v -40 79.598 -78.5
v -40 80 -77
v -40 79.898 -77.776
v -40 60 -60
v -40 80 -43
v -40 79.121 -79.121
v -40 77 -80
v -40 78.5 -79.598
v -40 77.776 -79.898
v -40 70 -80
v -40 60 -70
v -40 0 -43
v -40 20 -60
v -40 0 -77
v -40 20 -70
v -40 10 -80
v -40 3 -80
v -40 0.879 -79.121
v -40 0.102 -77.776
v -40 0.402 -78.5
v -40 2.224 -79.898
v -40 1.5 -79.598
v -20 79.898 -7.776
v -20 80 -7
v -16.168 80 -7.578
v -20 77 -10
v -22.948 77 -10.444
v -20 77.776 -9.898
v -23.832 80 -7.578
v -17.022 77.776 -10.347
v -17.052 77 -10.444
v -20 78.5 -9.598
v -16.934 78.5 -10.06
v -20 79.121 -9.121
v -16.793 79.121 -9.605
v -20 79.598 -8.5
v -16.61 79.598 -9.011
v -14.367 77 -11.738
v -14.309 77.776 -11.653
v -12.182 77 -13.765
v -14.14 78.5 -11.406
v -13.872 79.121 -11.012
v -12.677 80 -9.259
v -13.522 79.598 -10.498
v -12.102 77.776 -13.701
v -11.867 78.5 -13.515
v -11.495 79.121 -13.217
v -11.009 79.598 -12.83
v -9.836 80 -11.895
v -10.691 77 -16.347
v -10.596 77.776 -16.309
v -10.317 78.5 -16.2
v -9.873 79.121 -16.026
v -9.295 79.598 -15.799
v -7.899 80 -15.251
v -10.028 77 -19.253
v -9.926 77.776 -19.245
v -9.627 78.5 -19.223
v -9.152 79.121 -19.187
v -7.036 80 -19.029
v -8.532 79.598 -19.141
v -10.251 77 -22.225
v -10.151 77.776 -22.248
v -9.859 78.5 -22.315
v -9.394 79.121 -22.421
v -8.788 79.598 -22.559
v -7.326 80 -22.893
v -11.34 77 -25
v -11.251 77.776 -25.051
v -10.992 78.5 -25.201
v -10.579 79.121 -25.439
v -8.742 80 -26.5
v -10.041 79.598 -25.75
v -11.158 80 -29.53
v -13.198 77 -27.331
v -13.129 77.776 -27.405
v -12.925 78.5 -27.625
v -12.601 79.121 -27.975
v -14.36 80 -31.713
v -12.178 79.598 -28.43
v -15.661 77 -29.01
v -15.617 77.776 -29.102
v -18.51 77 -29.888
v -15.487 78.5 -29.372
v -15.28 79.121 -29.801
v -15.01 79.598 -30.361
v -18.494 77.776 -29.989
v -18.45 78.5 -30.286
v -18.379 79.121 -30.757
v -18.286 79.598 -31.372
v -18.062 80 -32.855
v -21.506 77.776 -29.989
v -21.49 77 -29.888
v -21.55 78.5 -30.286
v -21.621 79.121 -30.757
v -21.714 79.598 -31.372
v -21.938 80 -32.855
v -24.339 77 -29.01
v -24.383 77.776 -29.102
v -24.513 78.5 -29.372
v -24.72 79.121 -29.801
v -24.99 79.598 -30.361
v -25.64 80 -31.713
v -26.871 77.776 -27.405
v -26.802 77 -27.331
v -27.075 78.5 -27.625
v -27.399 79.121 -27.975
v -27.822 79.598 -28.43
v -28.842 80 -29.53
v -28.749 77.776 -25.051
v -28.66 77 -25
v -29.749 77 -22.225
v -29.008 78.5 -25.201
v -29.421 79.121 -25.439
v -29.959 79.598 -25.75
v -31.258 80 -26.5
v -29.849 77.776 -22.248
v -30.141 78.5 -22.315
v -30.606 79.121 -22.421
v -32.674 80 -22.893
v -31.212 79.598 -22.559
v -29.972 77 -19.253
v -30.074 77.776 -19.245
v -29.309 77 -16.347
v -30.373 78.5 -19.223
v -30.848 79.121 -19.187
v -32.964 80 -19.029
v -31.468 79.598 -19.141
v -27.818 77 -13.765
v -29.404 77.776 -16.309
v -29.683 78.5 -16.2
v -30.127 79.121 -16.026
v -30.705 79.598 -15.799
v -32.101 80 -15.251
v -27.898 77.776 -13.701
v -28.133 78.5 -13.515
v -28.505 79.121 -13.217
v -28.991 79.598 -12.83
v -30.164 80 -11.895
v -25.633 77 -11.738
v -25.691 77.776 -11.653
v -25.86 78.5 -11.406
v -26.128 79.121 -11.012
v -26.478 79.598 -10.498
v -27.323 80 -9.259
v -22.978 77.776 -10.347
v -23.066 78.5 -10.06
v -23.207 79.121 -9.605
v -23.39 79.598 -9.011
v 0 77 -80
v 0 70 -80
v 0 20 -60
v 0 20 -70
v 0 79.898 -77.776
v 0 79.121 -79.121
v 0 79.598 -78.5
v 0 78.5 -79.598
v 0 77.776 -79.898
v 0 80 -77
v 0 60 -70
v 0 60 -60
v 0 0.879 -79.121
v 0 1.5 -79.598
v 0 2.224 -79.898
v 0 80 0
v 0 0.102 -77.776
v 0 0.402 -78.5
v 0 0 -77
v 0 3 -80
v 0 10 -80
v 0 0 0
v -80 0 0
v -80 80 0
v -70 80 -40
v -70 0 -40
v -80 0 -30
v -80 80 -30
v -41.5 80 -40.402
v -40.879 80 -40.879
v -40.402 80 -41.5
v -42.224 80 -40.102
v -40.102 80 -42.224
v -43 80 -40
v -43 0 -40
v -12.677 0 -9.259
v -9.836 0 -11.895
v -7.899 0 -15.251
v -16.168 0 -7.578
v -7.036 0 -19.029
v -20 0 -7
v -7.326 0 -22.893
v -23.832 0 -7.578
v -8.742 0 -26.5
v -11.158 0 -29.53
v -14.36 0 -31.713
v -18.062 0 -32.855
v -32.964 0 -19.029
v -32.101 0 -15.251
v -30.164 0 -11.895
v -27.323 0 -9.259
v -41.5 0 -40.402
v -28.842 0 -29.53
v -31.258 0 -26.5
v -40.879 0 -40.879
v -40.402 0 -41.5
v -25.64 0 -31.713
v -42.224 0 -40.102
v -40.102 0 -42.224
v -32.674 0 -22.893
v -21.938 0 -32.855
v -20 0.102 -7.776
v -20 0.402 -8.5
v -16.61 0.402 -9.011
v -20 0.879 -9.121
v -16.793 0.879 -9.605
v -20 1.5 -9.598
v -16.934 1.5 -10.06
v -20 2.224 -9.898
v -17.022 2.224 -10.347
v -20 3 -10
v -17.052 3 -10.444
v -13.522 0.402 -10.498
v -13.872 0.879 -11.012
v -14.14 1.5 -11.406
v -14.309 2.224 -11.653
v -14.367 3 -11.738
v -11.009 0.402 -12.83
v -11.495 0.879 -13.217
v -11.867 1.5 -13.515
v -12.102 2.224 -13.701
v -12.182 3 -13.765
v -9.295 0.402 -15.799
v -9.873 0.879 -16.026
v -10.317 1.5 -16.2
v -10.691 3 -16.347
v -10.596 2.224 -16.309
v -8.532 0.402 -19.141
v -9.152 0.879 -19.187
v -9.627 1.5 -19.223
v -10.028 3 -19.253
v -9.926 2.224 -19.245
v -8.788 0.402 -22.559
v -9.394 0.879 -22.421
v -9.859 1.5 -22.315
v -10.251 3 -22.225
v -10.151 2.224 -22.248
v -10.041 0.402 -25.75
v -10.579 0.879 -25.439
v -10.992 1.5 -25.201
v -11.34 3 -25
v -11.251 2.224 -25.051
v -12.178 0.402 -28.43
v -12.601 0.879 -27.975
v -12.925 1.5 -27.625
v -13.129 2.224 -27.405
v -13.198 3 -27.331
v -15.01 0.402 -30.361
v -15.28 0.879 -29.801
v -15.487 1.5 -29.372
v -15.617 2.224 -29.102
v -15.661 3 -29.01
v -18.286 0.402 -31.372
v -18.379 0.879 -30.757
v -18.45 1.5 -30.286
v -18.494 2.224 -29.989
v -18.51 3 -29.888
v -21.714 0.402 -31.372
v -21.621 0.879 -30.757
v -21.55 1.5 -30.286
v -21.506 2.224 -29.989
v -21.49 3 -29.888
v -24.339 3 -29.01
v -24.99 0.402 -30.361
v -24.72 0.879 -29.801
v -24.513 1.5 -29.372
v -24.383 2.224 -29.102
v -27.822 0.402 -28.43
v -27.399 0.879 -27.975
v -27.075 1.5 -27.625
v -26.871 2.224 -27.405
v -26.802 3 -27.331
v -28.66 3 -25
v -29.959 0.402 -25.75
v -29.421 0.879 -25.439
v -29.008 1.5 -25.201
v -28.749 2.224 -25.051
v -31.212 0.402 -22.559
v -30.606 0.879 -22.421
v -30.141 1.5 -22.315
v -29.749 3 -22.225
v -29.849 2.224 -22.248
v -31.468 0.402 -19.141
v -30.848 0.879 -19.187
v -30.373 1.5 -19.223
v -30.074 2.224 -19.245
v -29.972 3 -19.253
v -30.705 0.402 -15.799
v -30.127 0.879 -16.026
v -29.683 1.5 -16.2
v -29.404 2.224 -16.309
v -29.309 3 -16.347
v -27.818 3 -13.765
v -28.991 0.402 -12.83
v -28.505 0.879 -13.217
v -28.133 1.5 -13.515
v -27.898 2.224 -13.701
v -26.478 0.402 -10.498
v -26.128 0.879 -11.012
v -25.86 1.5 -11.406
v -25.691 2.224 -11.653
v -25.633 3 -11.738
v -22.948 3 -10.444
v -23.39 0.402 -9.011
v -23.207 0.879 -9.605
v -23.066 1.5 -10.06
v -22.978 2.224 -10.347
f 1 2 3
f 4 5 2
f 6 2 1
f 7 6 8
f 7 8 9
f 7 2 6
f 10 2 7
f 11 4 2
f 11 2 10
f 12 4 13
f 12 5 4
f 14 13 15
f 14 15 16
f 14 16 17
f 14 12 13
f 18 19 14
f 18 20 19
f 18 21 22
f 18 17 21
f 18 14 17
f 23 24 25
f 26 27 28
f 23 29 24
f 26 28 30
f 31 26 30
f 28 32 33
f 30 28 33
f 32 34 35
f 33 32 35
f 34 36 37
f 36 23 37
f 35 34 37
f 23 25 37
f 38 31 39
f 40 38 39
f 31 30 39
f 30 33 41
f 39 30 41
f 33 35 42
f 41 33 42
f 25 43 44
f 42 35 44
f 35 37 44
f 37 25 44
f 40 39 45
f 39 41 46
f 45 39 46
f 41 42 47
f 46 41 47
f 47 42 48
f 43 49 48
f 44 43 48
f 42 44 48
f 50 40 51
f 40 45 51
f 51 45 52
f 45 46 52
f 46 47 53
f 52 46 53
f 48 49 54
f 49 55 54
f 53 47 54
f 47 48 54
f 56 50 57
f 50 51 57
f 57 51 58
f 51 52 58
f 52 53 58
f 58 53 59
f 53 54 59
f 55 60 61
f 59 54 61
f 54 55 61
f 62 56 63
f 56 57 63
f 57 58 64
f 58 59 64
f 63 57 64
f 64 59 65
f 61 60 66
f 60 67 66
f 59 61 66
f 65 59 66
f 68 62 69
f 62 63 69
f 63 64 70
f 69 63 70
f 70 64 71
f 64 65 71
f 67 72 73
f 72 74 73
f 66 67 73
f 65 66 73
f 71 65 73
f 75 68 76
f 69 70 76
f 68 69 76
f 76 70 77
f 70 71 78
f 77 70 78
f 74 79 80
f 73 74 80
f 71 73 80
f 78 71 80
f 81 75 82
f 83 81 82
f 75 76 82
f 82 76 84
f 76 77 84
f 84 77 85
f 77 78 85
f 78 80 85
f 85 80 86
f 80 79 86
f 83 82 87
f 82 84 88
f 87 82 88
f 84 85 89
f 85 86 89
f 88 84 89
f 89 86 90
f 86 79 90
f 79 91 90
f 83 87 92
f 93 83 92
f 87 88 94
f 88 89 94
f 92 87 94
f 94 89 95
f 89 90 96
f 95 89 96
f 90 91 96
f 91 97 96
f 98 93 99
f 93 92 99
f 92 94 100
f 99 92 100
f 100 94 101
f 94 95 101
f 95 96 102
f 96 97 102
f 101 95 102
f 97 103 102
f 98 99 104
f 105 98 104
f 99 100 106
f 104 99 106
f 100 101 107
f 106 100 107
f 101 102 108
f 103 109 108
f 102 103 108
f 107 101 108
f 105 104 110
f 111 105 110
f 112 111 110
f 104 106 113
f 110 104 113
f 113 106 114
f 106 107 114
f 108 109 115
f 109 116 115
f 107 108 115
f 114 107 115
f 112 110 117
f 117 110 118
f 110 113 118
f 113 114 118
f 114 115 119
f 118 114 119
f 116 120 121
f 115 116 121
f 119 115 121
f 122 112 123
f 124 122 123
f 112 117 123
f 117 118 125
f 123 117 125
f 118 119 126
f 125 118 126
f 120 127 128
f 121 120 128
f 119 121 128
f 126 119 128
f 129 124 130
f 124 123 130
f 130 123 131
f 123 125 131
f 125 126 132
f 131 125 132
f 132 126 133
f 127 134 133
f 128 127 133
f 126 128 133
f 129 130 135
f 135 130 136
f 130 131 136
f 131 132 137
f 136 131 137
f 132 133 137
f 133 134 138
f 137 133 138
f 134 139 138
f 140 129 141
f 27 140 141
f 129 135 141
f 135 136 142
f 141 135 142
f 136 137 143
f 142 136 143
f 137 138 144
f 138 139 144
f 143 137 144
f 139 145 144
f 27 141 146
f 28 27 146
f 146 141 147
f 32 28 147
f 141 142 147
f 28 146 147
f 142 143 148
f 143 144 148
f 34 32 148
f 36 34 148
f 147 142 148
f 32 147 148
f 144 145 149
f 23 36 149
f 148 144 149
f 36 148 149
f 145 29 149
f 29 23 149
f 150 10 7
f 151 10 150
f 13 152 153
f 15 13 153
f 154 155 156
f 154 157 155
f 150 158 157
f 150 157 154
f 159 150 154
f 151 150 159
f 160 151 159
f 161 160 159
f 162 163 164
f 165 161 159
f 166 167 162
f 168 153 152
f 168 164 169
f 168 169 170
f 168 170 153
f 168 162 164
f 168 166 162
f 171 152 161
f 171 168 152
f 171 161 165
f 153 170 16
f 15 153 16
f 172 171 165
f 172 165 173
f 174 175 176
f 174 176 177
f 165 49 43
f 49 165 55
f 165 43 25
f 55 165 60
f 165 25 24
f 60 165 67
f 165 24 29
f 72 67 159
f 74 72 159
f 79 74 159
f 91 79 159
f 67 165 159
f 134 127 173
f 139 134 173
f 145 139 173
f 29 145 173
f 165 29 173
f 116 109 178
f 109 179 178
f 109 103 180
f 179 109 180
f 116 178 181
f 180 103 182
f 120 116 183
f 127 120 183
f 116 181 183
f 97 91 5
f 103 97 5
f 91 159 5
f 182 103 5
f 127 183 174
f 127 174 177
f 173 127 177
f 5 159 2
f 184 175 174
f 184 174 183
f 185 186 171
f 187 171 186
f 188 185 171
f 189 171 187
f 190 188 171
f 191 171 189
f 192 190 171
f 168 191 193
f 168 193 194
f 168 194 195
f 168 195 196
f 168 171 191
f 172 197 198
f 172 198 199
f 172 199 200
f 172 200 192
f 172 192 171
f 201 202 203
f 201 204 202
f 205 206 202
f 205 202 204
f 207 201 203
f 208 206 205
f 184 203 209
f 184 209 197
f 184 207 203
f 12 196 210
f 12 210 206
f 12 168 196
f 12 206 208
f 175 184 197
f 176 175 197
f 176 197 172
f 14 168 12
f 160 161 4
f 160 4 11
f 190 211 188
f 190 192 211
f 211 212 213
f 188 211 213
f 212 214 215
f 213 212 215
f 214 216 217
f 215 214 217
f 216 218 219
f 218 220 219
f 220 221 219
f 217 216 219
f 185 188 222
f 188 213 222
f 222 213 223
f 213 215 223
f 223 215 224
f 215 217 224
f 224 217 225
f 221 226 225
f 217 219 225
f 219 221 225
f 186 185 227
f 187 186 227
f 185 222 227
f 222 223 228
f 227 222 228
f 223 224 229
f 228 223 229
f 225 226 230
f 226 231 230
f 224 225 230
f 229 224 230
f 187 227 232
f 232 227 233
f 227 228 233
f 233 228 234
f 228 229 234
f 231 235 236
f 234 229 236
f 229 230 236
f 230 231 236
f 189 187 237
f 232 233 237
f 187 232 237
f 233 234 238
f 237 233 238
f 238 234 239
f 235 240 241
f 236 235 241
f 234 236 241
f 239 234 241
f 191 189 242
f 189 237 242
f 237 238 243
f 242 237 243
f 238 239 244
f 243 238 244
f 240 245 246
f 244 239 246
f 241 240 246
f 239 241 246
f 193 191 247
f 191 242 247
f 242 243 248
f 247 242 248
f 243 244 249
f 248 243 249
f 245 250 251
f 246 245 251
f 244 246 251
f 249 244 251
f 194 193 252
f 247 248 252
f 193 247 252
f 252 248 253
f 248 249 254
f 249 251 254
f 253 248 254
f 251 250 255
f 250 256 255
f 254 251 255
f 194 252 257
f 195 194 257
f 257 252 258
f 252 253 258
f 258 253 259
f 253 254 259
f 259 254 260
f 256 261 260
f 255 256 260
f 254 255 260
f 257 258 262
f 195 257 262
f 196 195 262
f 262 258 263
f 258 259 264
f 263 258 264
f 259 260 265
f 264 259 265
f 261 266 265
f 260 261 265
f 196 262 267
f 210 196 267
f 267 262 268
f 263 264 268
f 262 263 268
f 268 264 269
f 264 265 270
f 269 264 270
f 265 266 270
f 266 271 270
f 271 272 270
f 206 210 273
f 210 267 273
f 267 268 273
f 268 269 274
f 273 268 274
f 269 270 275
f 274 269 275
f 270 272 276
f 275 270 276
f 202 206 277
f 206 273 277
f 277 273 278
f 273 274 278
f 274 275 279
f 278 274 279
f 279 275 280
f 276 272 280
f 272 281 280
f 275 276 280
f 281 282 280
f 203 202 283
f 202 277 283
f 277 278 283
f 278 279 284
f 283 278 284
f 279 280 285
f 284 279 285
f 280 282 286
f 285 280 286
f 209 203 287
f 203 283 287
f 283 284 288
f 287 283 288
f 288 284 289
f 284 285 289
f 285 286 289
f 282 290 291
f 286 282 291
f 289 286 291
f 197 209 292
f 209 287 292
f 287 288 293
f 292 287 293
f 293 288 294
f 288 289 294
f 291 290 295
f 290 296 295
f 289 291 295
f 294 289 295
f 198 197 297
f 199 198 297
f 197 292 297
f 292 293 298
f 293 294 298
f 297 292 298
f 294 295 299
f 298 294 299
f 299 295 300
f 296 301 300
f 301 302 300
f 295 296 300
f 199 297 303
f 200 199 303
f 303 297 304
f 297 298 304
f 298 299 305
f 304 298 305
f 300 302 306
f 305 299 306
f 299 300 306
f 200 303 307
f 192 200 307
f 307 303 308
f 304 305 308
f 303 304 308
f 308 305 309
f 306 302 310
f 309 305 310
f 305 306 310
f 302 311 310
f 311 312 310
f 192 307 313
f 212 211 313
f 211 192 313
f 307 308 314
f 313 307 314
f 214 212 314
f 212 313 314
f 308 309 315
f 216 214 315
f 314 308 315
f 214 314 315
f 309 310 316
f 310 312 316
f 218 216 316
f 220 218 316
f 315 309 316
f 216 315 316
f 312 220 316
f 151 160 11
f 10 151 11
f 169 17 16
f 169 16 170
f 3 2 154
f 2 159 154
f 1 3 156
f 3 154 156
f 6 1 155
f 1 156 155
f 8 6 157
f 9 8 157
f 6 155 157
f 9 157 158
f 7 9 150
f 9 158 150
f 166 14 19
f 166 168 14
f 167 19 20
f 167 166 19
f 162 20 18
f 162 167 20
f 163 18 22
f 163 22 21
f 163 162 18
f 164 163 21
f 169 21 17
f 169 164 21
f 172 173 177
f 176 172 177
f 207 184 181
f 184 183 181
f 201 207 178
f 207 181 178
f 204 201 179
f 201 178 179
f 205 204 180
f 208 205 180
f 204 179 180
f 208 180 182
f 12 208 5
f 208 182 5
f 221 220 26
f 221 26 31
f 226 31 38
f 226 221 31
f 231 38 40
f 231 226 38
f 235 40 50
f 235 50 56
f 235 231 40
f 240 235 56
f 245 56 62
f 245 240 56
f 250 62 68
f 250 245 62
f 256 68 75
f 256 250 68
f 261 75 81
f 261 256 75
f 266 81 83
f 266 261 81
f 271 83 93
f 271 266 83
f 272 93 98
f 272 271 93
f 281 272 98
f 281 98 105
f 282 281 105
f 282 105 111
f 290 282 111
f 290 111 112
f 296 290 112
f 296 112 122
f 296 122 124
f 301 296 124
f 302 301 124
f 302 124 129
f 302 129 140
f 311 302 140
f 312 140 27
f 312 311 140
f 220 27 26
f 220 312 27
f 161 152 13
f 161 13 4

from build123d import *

# Parameters (mm, degrees)
SKETCH2_R           = 10
BOSS_EXTRUDE1_DEPTH = 80
SKETCH4_W           = 20
SKETCH4_H           = 40
CUT_EXTRUDE1_DEPTH  = 139.564064606
FILLET1_R           = 3
FILLET2_R           = 3
CHAMFER1_SIZE       = 10
CHAMFER2_SIZE       = 10
CHAMFER3_SIZE       = 10
FILLET4_R           = 3
FILLET5_R           = 3
FILLET6_R           = 3


with BuildPart() as part:
    # Sketch2 → Boss-Extrude1 (new body)
    with BuildSketch(Plane(origin=(0, 0, 0), x_dir=(1, 0, 0), z_dir=(0, 1, 0))):
        Polygon((0, 0), (-80, 0), (-80, 40), (-40, 40), (-40, 80), (0, 80), align=None)
        with Locations(Location((-20, 20, 0), (0, 0, 270))):
            Circle(SKETCH2_R, mode=Mode.SUBTRACT)
    extrude(amount=BOSS_EXTRUDE1_DEPTH)

    # Sketch4 → Cut-Extrude1 (cut, through all)
    with BuildSketch(Plane(origin=(0, 0, 0), x_dir=(0, 0, -1), z_dir=(1, 0, 0))):
        with Locations((70, 40)):
            Rectangle(SKETCH4_W, SKETCH4_H)
    extrude(amount=-CUT_EXTRUDE1_DEPTH, mode=Mode.SUBTRACT)

    # Fillet1
    fillet1_edges = [part.edges().sort_by_distance(p)[0] for p in [
        (-20, 0, -80),
    ]]
    fillet(fillet1_edges, radius=FILLET1_R)

    # Fillet2
    fillet2_edges = [part.edges().sort_by_distance(p)[0] for p in [
        (-20, 80, -80),
    ]]
    fillet(fillet2_edges, radius=FILLET2_R)

    # Chamfer1
    chamfer1_edges = [part.edges().sort_by_distance(p)[0] for p in [
        (-20, 60, -80),
    ]]
    chamfer(chamfer1_edges, length=CHAMFER1_SIZE)

    # Chamfer2
    chamfer2_edges = [part.edges().sort_by_distance(p)[0] for p in [
        (-20, 20, -80),
    ]]
    chamfer(chamfer2_edges, length=CHAMFER2_SIZE)

    # Chamfer3
    chamfer3_edges = [part.edges().sort_by_distance(p)[0] for p in [
        (-80, 40, -40),
    ]]
    chamfer(chamfer3_edges, length=CHAMFER3_SIZE)

    # Fillet4
    fillet4_edges = [part.edges().sort_by_distance(p)[0] for p in [
        (-40, 40, -40),
    ]]
    fillet(fillet4_edges, radius=FILLET4_R)

    # Fillet5
    fillet5_edges = [part.edges().sort_by_distance(p)[0] for p in [
        (-20, 0, -30),
    ]]
    fillet(fillet5_edges, radius=FILLET5_R)

    # Fillet6
    fillet6_edges = [part.edges().sort_by_distance(p)[0] for p in [
        (-20, 80, -30),
    ]]
    fillet(fillet6_edges, radius=FILLET6_R)


solid = part.part
